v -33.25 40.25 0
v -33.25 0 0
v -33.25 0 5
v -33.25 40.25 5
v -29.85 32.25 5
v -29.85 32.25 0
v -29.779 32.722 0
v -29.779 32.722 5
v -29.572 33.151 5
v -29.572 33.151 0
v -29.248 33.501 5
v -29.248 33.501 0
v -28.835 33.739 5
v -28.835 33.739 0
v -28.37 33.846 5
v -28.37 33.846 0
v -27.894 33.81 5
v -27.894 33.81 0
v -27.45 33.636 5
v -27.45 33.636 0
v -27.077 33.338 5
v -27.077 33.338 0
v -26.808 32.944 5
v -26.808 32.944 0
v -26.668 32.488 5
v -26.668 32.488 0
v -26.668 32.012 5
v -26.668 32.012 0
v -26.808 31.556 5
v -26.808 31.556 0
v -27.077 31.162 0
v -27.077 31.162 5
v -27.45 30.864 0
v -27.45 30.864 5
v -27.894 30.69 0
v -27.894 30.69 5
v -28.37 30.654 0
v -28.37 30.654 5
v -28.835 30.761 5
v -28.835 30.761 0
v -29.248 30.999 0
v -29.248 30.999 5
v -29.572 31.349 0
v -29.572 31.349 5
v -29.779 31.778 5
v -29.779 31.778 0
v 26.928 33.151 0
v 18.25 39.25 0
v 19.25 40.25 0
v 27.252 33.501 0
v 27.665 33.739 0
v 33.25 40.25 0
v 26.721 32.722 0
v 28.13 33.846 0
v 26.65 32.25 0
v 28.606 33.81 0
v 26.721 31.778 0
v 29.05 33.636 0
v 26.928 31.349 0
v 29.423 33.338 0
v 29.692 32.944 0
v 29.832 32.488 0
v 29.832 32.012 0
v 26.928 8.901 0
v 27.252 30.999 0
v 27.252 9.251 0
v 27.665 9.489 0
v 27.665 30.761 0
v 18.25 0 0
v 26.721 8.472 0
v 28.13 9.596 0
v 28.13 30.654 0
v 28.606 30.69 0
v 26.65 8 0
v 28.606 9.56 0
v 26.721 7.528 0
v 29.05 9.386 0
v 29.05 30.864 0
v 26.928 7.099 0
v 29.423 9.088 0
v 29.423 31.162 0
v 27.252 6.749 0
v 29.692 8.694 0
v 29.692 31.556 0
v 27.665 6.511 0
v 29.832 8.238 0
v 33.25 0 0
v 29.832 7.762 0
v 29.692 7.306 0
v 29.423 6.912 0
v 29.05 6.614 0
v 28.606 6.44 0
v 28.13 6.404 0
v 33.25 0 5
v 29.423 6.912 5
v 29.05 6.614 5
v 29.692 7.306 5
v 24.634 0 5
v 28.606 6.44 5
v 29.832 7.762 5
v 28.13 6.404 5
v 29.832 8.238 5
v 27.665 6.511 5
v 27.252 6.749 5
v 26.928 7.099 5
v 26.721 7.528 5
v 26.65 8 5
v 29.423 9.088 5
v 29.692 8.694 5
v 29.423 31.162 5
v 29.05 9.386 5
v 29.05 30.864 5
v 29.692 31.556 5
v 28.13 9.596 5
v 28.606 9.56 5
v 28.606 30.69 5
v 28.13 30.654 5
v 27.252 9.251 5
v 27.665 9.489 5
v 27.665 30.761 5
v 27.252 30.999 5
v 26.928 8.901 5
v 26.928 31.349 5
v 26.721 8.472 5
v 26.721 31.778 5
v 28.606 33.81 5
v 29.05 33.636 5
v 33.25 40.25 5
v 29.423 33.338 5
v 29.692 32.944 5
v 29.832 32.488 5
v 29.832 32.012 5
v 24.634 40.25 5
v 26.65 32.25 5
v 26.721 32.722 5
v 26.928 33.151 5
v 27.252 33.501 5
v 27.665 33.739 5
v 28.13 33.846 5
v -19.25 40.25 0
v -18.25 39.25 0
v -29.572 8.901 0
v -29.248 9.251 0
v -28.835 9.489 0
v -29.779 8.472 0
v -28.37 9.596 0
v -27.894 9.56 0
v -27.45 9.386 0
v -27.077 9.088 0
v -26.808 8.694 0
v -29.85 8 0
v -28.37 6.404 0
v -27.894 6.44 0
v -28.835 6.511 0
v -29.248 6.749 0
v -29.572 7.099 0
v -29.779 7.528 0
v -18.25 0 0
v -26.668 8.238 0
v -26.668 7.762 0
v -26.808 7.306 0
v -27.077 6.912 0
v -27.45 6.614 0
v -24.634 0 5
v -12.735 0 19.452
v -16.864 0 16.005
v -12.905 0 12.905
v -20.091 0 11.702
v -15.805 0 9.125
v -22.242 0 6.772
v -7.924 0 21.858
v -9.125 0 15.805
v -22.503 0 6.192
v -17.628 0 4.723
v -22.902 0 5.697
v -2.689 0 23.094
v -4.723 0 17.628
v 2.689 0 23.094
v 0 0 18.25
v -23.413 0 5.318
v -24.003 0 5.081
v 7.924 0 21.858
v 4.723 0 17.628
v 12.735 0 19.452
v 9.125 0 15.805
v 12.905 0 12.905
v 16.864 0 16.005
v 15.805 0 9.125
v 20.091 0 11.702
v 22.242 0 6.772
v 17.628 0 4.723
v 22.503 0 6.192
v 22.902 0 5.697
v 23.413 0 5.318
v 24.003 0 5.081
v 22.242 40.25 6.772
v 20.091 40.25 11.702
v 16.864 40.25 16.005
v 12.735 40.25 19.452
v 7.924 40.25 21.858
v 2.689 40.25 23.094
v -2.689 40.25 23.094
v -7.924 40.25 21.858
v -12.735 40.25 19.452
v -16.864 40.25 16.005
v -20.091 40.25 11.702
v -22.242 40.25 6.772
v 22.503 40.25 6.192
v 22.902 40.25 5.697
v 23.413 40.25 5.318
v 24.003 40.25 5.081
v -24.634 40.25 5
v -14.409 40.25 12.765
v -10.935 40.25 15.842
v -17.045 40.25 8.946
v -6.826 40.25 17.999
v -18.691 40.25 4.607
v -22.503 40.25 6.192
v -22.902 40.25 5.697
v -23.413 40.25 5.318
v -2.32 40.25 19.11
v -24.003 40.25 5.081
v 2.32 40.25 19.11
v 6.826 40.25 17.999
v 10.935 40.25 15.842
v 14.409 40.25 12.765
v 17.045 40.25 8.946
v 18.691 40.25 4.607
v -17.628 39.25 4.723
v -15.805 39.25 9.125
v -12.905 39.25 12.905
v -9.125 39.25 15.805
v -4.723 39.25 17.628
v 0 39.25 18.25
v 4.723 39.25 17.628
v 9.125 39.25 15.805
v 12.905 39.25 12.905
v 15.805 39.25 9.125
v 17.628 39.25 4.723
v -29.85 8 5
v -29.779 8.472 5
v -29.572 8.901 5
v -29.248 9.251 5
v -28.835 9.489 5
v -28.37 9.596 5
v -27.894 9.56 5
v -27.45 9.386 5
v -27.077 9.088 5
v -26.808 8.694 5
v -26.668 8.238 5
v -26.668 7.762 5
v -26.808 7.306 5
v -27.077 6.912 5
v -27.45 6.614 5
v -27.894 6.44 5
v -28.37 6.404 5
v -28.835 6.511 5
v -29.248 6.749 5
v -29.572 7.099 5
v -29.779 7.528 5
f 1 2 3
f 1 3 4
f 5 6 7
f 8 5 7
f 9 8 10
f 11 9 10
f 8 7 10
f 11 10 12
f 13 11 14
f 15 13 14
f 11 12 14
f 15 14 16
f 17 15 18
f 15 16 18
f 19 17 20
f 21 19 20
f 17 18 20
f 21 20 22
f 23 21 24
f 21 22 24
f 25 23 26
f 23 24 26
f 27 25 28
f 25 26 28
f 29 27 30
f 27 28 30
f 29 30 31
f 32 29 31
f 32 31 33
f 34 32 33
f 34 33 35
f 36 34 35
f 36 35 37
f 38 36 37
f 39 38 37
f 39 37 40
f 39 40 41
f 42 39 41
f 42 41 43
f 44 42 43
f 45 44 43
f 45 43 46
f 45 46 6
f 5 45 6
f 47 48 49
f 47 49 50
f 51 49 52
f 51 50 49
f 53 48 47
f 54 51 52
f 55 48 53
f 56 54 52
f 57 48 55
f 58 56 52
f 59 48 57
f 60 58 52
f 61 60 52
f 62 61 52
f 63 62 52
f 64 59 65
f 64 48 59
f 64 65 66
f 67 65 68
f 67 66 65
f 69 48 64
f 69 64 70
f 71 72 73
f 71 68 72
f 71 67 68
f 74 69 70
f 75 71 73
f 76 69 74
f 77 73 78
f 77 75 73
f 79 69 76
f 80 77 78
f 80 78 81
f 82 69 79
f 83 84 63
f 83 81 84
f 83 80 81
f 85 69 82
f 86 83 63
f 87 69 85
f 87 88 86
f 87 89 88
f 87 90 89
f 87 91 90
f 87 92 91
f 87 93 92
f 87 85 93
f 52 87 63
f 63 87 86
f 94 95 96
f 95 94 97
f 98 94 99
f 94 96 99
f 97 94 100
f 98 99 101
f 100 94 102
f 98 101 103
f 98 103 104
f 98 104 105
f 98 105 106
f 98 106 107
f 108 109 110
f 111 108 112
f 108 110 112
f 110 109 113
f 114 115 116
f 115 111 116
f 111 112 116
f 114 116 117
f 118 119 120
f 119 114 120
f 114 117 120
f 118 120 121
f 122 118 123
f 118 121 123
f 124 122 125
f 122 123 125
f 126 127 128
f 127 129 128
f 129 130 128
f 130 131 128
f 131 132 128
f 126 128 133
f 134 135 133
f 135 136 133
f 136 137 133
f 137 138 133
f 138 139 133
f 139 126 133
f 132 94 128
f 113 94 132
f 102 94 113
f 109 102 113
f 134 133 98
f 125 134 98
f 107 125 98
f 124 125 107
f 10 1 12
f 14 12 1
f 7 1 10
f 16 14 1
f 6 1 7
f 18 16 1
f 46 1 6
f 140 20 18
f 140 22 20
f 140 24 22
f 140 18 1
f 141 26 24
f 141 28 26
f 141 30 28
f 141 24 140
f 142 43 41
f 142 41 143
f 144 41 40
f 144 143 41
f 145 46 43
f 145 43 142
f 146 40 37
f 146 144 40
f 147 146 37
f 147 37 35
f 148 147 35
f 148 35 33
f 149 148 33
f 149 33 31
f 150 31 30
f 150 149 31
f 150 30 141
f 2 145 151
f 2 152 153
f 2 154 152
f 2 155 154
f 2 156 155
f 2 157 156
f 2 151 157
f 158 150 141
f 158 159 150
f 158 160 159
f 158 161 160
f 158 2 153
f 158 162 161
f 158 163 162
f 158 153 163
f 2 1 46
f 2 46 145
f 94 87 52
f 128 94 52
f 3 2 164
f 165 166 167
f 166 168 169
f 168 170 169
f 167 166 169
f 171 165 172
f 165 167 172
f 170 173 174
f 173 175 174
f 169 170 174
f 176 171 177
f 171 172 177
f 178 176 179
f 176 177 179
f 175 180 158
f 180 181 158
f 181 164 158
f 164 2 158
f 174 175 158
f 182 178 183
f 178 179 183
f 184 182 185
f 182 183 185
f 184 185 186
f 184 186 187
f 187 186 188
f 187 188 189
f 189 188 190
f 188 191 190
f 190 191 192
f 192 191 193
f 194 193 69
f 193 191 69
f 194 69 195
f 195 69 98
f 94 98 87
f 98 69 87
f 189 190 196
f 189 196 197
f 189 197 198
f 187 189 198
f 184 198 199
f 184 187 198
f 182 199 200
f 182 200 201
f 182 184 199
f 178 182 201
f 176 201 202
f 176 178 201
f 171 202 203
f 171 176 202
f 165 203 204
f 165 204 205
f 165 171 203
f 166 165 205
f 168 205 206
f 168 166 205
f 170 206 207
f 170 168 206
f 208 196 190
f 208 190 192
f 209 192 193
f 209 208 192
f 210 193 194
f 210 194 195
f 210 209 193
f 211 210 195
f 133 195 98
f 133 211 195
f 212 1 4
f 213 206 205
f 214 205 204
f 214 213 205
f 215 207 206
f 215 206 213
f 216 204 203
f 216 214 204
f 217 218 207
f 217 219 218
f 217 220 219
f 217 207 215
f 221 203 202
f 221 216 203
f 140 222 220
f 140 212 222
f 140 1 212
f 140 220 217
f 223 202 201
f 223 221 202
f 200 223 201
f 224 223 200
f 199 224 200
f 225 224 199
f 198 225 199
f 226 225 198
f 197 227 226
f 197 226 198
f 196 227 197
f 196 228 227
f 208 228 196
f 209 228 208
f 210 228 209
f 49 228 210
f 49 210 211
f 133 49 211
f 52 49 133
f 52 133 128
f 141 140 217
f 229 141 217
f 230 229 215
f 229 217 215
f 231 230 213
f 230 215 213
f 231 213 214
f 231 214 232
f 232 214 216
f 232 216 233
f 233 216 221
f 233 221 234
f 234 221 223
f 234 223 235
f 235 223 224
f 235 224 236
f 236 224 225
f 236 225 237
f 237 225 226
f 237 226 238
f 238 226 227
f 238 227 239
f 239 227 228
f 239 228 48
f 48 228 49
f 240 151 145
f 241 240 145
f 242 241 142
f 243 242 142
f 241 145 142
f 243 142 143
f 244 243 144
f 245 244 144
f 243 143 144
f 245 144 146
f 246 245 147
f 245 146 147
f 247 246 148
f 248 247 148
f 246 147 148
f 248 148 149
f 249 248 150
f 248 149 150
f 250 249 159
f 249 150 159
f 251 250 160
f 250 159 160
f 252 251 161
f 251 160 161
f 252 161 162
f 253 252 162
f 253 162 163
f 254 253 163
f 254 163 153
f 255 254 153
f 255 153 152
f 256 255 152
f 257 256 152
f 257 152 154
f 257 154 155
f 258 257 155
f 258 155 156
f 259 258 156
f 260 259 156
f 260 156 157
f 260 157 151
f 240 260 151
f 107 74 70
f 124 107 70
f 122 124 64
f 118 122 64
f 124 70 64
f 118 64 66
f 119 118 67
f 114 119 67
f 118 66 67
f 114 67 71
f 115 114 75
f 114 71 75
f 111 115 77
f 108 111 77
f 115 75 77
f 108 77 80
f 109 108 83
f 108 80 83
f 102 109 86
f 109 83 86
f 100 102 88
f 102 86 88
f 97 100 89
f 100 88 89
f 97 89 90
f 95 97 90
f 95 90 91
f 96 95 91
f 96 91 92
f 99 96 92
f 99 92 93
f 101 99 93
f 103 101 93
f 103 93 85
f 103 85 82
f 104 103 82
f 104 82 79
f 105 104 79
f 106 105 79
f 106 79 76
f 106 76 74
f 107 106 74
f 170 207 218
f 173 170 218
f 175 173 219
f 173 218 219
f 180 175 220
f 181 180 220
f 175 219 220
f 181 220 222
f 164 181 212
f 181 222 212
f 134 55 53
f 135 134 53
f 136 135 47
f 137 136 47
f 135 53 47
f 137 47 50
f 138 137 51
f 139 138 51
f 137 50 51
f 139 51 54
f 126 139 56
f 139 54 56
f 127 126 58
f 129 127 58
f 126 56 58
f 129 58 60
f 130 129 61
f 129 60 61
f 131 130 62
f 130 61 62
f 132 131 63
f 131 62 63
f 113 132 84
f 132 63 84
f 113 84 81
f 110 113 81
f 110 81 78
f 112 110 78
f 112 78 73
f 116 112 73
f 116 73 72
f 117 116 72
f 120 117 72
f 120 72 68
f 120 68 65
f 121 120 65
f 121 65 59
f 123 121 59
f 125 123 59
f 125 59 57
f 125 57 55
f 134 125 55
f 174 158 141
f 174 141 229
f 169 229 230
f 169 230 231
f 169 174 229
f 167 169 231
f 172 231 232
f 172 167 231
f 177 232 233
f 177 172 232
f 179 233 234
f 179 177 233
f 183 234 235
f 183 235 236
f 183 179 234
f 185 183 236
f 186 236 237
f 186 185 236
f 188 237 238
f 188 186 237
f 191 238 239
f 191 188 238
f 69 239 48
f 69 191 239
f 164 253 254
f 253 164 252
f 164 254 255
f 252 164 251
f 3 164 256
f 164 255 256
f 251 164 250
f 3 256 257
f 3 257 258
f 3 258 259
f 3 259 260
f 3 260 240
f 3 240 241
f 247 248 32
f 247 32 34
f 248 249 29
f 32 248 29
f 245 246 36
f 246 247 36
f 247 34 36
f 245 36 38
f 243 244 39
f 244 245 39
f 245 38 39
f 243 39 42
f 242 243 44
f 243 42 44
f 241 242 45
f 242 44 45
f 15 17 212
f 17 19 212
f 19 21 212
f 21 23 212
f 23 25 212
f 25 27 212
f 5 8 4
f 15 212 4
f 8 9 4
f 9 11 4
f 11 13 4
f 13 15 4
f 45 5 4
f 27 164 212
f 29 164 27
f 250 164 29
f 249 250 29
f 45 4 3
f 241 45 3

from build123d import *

# Parameters (mm, degrees)
EXTRUDE_1_DEPTH     = 40.25
SKETCH_2_W          = 10
SKETCH_2_H          = 40.25
EXTRUDE_2_DEPTH     = 5
EXTRUDE_2_2_DEPTH   = 5
EXTRUDE_3_DEPTH     = 40.25
CHAMFER_1_SIZE      = 1
SKETCH_4_R          = 1.6
CUT_EXTRUDE_1_DEPTH = 24.25


with BuildPart() as part:
    # Эскиз1 → Бобышка-Вытянуть1 (new body)
    with BuildSketch(Plane(origin=(0, 0, 0), x_dir=(1, 0, 0), z_dir=(0, 1, 0))):
        with BuildLine():
            Line((-23.25, 0), (-18.25, 0))
            ThreePointArc((-18.25, 0), (0, -18.25), (18.25, 0))
            Line((18.25, 0), (23.25, 0))
            ThreePointArc((23.25, 0), (0, -23.25), (-23.25, 0))
        make_face()
    extrude(amount=EXTRUDE_1_DEPTH)



with BuildPart() as body_2:
    # Эскиз2 → Бобышка-Вытянуть2 (new body)
    with BuildSketch(Plane(origin=(0, 0, 0), x_dir=(-1, 0, 0), z_dir=(0, 0, -1))):
        with Locations((-28.25, 20.125)):
            Rectangle(SKETCH_2_W, SKETCH_2_H)
    extrude(amount=-EXTRUDE_2_DEPTH)


with BuildPart() as body_3:
    # Эскиз2 → Extrude 2 2 (new body)
    with BuildSketch(Plane(origin=(0, 0, 0), x_dir=(-1, 0, 0), z_dir=(0, 0, -1))):
        with Locations((28.25, 20.125)):
            Rectangle(SKETCH_2_W, SKETCH_2_H)
    extrude(amount=-EXTRUDE_2_2_DEPTH)


with BuildPart() as part_1:
    add(part.part)

    add(body_2.part)  # Бобышка-Вытянуть3 merges body 2

    add(body_3.part)  # Бобышка-Вытянуть3 merges body 3
    # Эскиз3 → Бобышка-Вытянуть3 (add)
    with BuildSketch(Plane(origin=(0, 40.25, 0), x_dir=(1, 0, 0), z_dir=(0, 1, 0))):
        with BuildLine():
            Line((23.25, -5), (23.25, 0))
            ThreePointArc((23.25, 0), (22.996608271, -3.423230646), (22.241956297, -6.77184466))
            ThreePointArc((22.241956297, -6.77184466), (23.14534213, -5.491220725), (24.6335645, -5))
            Line((24.6335645, -5), (23.25, -5))
        make_face()
        with BuildLine():
            Line((-23.25, -5), (-23.25, 0))
            ThreePointArc((-23.25, 0), (-22.996608271, -3.423230646), (-22.241956297, -6.77184466))
            ThreePointArc((-22.241956297, -6.77184466), (-23.14534213, -5.491220725), (-24.6335645, -5))
            Line((-24.6335645, -5), (-23.25, -5))
        make_face()
    extrude(amount=-EXTRUDE_3_DEPTH)

    # Фаска1
    chamfer_1_edges = [part_1.edges().sort_by_distance(p)[0] for p in [
        (0, 40.25, 18.25),
    ]]
    chamfer(chamfer_1_edges, length=CHAMFER_1_SIZE)

    # Эскиз4 → Вырез-Вытянуть1 (cut, through all)
    with BuildSketch(Plane(origin=(0, 0, 0), x_dir=(-1, 0, 0), z_dir=(0, 0, -1))):
        with Locations((28.25, 32.25)):
            Circle(SKETCH_4_R)
        with Locations((28.25, 8)):
            Circle(SKETCH_4_R)
        with Locations((-28.25, 32.25)):
            Circle(SKETCH_4_R)
        with Locations((-28.25, 8)):
            Circle(SKETCH_4_R)
    extrude(amount=-CUT_EXTRUDE_1_DEPTH, mode=Mode.SUBTRACT)


solid = part_1.part
